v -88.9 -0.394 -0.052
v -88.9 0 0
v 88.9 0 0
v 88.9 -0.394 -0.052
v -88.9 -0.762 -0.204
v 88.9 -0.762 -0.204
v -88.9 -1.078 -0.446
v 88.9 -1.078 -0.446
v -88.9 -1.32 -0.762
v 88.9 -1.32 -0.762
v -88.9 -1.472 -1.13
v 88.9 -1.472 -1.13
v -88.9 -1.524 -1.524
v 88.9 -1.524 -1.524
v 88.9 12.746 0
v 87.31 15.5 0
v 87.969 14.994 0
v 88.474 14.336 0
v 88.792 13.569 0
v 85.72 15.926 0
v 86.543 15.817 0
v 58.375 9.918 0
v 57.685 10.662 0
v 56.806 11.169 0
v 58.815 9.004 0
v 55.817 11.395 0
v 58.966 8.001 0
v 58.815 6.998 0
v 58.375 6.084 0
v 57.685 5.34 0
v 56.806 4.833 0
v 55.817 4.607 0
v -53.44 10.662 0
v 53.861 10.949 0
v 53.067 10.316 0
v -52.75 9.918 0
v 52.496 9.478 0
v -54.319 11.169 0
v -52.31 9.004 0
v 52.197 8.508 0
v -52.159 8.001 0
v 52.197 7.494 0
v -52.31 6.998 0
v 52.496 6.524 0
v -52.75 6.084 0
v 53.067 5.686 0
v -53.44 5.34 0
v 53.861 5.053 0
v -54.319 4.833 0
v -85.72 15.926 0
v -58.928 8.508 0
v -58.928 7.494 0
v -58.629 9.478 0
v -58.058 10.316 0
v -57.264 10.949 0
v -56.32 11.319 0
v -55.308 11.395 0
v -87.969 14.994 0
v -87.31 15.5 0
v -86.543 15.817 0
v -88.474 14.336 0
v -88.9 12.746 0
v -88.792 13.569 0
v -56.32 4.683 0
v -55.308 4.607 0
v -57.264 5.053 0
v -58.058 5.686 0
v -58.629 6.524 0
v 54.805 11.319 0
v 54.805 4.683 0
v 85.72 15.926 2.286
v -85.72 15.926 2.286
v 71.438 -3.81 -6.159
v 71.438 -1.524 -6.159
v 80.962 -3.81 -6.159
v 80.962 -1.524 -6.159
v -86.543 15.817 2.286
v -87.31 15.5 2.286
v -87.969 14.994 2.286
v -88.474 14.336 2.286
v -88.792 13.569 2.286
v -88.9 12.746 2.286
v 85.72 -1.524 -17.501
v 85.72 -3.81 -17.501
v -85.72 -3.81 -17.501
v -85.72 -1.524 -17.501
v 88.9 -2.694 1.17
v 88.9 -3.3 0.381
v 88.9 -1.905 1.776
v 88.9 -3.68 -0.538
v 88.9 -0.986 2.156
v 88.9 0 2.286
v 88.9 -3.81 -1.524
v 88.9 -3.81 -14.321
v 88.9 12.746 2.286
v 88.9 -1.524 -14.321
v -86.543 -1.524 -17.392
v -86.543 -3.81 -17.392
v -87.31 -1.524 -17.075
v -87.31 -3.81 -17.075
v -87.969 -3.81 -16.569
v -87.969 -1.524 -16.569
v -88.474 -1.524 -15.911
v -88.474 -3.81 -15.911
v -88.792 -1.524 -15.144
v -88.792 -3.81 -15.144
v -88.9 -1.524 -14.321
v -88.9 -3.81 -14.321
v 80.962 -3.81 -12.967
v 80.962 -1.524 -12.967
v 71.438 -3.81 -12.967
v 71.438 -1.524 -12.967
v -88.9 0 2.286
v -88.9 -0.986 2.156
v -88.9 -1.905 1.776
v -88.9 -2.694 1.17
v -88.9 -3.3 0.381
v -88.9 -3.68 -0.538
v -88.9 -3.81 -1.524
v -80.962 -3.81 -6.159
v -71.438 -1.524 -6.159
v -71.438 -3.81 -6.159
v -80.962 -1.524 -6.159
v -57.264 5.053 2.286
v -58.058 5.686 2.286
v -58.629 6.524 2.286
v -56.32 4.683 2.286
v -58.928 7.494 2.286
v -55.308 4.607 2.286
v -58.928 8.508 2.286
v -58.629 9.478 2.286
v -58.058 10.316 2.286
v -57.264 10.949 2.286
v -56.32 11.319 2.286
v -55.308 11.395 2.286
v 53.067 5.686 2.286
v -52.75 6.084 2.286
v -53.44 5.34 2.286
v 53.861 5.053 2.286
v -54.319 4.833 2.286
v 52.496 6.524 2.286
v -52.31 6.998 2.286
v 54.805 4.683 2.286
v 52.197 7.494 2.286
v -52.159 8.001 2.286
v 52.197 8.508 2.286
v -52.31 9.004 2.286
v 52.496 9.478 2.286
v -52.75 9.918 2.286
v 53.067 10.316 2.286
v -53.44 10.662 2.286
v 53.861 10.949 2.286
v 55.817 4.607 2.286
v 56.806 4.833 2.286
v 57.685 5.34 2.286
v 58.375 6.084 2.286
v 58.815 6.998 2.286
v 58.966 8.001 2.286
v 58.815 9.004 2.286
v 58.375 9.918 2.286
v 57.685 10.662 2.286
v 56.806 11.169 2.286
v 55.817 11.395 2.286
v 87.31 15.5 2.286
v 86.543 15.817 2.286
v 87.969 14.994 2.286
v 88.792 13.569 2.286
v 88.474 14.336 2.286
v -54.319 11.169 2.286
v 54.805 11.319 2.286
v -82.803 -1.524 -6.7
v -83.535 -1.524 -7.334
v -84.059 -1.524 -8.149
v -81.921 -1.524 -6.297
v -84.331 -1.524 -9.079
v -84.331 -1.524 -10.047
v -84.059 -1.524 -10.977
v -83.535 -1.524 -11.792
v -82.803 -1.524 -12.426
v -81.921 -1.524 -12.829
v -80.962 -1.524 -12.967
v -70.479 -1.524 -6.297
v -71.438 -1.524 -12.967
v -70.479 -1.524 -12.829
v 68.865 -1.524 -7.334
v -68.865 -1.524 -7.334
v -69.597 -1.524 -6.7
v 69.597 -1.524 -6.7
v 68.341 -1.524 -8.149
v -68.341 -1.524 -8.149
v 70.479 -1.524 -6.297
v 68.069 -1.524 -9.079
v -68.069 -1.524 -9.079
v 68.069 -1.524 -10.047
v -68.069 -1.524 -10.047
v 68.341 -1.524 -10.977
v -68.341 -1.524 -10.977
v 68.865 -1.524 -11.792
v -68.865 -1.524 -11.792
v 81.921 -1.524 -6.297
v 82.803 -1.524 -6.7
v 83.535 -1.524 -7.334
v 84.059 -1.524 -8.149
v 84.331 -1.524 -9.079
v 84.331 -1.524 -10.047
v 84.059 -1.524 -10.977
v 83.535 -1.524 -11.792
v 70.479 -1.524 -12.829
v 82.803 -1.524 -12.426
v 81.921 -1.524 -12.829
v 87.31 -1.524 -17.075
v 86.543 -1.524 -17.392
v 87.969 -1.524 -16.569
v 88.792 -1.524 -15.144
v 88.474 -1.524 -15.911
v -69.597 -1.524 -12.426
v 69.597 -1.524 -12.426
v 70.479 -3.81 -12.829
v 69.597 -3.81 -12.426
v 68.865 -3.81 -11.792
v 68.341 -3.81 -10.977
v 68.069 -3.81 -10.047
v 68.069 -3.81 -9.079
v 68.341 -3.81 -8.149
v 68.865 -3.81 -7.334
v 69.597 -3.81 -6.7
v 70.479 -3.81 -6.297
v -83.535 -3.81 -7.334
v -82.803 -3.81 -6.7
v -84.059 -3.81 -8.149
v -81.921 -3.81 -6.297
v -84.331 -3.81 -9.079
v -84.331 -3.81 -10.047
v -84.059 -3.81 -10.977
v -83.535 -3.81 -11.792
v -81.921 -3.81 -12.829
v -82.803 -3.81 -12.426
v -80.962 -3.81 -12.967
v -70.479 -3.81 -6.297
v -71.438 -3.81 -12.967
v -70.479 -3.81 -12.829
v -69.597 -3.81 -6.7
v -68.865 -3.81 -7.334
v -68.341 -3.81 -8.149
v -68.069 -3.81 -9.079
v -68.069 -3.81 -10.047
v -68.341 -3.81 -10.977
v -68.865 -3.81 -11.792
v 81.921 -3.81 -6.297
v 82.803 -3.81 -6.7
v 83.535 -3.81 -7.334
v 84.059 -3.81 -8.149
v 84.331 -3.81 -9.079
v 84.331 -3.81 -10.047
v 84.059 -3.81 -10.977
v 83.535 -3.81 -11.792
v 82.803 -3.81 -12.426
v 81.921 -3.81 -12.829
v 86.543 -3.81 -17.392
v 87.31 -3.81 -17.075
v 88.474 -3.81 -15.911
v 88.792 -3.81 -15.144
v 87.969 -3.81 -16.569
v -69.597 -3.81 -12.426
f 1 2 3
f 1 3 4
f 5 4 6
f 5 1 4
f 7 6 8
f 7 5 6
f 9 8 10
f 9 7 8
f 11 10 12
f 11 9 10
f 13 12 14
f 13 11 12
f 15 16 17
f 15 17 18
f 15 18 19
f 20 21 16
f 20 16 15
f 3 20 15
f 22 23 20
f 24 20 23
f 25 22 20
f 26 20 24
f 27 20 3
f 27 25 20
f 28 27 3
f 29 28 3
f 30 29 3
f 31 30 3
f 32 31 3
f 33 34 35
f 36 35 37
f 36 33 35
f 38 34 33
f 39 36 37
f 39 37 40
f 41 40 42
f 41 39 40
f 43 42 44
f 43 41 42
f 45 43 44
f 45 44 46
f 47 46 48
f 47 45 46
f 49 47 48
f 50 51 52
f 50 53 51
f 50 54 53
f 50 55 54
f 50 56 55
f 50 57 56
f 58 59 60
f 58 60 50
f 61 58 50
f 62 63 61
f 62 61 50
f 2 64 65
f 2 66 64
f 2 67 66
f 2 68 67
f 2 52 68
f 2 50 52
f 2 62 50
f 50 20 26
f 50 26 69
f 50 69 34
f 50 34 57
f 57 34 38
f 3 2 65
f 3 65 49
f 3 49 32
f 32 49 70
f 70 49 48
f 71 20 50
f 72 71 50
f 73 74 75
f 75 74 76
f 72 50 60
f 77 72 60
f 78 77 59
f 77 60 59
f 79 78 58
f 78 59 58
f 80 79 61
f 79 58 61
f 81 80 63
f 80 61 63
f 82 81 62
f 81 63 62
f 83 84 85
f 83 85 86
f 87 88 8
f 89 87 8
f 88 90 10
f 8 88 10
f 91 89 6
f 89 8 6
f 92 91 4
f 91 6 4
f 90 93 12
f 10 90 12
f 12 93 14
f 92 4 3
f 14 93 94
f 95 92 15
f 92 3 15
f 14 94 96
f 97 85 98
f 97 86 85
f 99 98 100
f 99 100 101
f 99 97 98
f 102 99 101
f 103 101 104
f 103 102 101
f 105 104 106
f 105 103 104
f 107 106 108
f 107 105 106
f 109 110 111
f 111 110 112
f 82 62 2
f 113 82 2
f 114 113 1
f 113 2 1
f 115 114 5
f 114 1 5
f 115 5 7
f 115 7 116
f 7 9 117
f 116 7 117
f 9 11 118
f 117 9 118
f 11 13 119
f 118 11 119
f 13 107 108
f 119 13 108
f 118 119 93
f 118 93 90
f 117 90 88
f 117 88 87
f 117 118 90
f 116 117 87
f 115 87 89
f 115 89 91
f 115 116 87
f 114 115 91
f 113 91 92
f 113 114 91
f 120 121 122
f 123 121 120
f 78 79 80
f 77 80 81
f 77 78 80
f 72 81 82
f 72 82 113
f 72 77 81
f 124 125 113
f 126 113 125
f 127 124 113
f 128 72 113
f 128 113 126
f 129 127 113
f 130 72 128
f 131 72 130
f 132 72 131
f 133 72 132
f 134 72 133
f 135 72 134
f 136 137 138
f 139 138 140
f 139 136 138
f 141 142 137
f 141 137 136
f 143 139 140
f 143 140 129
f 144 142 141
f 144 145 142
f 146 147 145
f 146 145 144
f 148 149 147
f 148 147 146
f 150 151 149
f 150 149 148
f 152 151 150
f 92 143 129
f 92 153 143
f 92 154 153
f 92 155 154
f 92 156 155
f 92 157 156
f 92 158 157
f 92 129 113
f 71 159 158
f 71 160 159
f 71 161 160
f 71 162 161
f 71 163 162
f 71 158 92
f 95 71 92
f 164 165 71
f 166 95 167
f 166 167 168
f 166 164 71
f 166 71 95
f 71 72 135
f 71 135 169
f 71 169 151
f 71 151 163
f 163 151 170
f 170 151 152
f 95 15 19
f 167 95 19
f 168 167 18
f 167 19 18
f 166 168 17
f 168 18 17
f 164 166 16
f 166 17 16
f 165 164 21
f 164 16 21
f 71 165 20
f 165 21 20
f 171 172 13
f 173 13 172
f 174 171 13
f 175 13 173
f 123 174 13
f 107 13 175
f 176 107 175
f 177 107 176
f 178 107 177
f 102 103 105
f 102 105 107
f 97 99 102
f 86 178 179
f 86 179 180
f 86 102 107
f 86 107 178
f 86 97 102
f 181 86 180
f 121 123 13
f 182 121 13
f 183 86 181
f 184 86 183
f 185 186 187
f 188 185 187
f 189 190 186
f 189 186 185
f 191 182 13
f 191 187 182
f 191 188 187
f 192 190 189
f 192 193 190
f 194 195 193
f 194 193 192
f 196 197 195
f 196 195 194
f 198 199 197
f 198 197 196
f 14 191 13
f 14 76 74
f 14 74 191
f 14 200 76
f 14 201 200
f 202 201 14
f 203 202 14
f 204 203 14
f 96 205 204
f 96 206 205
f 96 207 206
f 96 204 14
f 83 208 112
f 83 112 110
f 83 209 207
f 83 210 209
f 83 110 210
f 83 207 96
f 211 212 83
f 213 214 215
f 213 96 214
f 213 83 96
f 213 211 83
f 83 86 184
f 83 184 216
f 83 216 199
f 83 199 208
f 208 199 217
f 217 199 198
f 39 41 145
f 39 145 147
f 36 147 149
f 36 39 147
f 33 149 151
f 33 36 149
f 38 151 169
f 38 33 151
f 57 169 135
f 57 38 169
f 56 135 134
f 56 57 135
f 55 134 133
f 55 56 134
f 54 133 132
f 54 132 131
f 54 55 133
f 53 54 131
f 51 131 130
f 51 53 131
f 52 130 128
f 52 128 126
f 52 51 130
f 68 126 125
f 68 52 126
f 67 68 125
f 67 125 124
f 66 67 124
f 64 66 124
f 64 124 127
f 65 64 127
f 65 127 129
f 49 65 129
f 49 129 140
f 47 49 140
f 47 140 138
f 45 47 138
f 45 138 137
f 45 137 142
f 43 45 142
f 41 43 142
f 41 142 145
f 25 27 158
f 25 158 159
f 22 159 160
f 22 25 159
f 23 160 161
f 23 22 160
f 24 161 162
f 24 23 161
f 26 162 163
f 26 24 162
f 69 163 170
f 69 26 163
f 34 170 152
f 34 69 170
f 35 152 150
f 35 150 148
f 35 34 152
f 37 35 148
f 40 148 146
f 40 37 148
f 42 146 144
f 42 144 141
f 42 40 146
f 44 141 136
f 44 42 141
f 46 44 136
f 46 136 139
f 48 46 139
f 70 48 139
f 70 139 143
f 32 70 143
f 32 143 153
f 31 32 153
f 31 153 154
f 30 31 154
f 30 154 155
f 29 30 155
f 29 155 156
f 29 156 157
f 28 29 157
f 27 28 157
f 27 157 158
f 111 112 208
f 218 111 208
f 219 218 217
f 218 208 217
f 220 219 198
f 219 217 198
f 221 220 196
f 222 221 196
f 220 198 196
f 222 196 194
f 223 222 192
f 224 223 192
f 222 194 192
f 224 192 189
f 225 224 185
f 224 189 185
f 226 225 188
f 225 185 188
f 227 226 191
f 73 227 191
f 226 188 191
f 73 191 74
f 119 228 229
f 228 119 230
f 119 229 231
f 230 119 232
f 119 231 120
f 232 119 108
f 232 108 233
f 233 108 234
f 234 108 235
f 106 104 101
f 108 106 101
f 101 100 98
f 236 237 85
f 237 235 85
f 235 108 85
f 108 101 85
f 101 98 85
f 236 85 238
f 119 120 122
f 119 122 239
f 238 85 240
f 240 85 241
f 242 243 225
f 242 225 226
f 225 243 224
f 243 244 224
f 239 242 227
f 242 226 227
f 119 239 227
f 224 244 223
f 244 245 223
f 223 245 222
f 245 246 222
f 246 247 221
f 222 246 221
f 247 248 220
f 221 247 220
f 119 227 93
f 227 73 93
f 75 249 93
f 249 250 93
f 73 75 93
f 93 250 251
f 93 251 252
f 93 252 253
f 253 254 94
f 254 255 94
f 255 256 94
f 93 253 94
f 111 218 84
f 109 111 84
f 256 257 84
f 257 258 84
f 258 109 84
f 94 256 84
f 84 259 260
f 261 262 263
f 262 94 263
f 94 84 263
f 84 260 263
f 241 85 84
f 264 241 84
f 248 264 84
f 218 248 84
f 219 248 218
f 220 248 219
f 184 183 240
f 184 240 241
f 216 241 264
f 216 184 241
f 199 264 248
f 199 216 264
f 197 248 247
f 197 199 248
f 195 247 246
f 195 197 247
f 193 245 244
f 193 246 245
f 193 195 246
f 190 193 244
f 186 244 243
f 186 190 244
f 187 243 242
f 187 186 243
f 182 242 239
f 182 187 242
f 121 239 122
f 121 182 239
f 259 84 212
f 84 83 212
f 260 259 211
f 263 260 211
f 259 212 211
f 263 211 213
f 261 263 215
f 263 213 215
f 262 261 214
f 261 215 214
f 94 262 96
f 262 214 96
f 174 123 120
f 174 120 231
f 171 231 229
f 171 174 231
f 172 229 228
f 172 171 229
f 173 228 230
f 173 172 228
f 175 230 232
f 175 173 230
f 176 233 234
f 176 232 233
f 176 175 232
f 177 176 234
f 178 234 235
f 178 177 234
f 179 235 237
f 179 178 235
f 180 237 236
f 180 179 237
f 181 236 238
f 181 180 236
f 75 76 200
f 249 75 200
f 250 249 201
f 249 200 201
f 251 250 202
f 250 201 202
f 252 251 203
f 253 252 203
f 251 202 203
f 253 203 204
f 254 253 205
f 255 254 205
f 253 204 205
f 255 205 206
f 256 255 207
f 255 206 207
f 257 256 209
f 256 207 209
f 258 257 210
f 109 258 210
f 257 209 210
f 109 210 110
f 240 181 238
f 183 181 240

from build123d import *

# Parameters (mm, degrees)
EXTRUDE1_DEPTH             = 88.9
FILLET1_R                  = 3.18
EXTRUDE2_REACH             = 94.271
EXTRUDE3_REACH             = 93.995
SKETCH3_R                  = 3.4036
FLATTEN_BENDS1_START       = -1.524
FLATTEN_BENDS1_OUTLINE_W   = 177.8
FLATTEN_BENDS1_OUTLINE_H   = 5.286
FLATTEN_BENDS1_DEPTH       = 17.4498
FLATTEN_BENDS1_START_2     = -3.81
FLATTEN_BENDS1_2_OUTLINE_R = 3.4036
FLATTEN_BENDS1_2_DEPTH     = 2.286
PROCESS_BENDS1_START       = 2.234903703
PROCESS_BENDS1_OUTLINE_W   = 177.8
PROCESS_BENDS1_OUTLINE_H   = 2.286
PROCESS_BENDS1_DEPTH       = 16.356210101
PROCESS_BENDS1_2_OUTLINE_R = 3.4036
PROCESS_BENDS1_2_DEPTH     = 1.8835878
PROCESS_BENDS1_START_2     = 2.04455268
PROCESS_BENDS1_3_OUTLINE_W = 177.8
PROCESS_BENDS1_3_OUTLINE_H = 2.286
PROCESS_BENDS1_3_DEPTH     = 0.190351023
PROCESS_BENDS1_START_3     = -1.524
PROCESS_BENDS1_4_OUTLINE_R = 3.4036
PROCESS_BENDS1_4_DEPTH     = 3.81
PROCESS_BENDS1_START_4     = -88.9
PROCESS_BENDS1_5_DEPTH     = 177.8


with BuildPart() as part:
    # Sketch1 → Extrude1 (new, symmetric)
    with BuildSketch(Plane(origin=(0, 0, 0), x_dir=(0, 0, -1), z_dir=(1, 0, 0))):
        with BuildLine():
            Line((17.5006, -3.81), (17.5006, -1.524))
            Line((17.5006, -1.524), (1.524, -1.524))
            ThreePointArc((1.524, -1.524), (0.446369265, -1.077630735), (0, 0))
            Line((0, 0), (0, 15.9258))
            Line((0, 15.9258), (-2.286, 15.9258))
            Line((-2.286, 15.9258), (-2.286, 0))
            ThreePointArc((-2.286, 0), (-1.170076836, -2.694076836), (1.524, -3.81))
            Line((1.524, -3.81), (17.5006, -3.81))
        make_face()
    extrude(amount=EXTRUDE1_DEPTH, both=True)

    # Fillet1
    fillet1_edges = [part.edges().sort_by_distance(p)[0] for p in [
        (-88.9, -2.667, -17.5006),
        (88.9, 15.9258, 1.143),
        (88.9, -2.667, -17.5006),
        (-88.9, 15.9258, 1.143),
    ]]
    fillet(fillet1_edges, radius=FILLET1_R)

    # Sketch2 → Extrude2 (cut, up to next)
    with BuildSketch(Plane(origin=(0, -1.524, 0), x_dir=(1, 0, 0), z_dir=(0, 1, 0)), mode=Mode.PRIVATE) as extrude2_sk1:
        with BuildLine():
            Line((80.9625, 12.9667), (71.4375, 12.9667))
            ThreePointArc((71.4375, 12.9667), (68.0339, 9.5631), (71.4375, 6.1595))
            Line((71.4375, 6.1595), (80.9625, 6.1595))
            ThreePointArc((80.9625, 6.1595), (84.3661, 9.5631), (80.9625, 12.9667))
        make_face()
    extrude2_tool1 = extrude(extrude2_sk1.sketch, amount=-EXTRUDE2_REACH, mode=Mode.PRIVATE) & part.part
    # Sketch2 → Extrude2 (cut, up to next)
    with BuildSketch(Plane(origin=(0, -1.524, 0), x_dir=(1, 0, 0), z_dir=(0, 1, 0)), mode=Mode.PRIVATE) as extrude2_sk2:
        with BuildLine():
            Line((-71.4375, 6.1595), (-80.9625, 6.1595))
            ThreePointArc((-80.9625, 6.1595), (-84.3661, 9.5631), (-80.9625, 12.9667))
            Line((-80.9625, 12.9667), (-71.4375, 12.9667))
            ThreePointArc((-71.4375, 12.9667), (-68.0339, 9.5631), (-71.4375, 6.1595))
        make_face()
    extrude2_tool2 = extrude(extrude2_sk2.sketch, amount=-EXTRUDE2_REACH, mode=Mode.PRIVATE) & part.part
    add(extrude2_tool1.solids().sort_by_distance((76.2, -1.524, -9.5631))[0], mode=Mode.SUBTRACT)
    add(extrude2_tool2.solids().sort_by_distance((-76.2, -1.524, -9.5631))[0], mode=Mode.SUBTRACT)

    # Sketch3 → Extrude3 (cut, up to next)
    with BuildSketch(Plane(origin=(0, 0, 0), x_dir=(-1, 0, 0), z_dir=(0, 0, -1)), mode=Mode.PRIVATE) as extrude3_sk1:
        with Locations(Location((-55.5625, 8.001, 0), (0, 0, 90))):
            Circle(SKETCH3_R)
    extrude3_tool1 = extrude(extrude3_sk1.sketch, amount=-EXTRUDE3_REACH, mode=Mode.PRIVATE) & part.part
    # Sketch3 → Extrude3 (cut, up to next)
    with BuildSketch(Plane(origin=(0, 0, 0), x_dir=(-1, 0, 0), z_dir=(0, 0, -1)), mode=Mode.PRIVATE) as extrude3_sk2:
        with Locations(Location((55.5625, 8.001, 0), (0, 0, 90))):
            Circle(SKETCH3_R)
    extrude3_tool2 = extrude(extrude3_sk2.sketch, amount=-EXTRUDE3_REACH, mode=Mode.PRIVATE) & part.part
    add(extrude3_tool1.solids().sort_by_distance((55.5625, 8.001, 0))[0], mode=Mode.SUBTRACT)
    add(extrude3_tool2.solids().sort_by_distance((-55.5625, 8.001, 0))[0], mode=Mode.SUBTRACT)

    # Flatten-Bends1: read off the stored shape, not the designer's step
    # Flatten-Bends1 outline → Flatten-Bends1 (cut)
    with BuildSketch(Plane(origin=(0, 0, 0), x_dir=(1, 0, 0), z_dir=(0, 1, 0)).offset(FLATTEN_BENDS1_START)):
        with Locations((0, 0.357)):
            Rectangle(FLATTEN_BENDS1_OUTLINE_W, FLATTEN_BENDS1_OUTLINE_H)
    extrude(amount=FLATTEN_BENDS1_DEPTH, mode=Mode.SUBTRACT)

    # Flatten-Bends1 2 outline → Flatten-Bends1 2 (add)
    with BuildSketch(Plane(origin=(0, 0, 0), x_dir=(1, 0, 0), z_dir=(0, 1, 0)).offset(FLATTEN_BENDS1_START_2)):
        with BuildLine():
            ThreePointArc((-88.9, -15.411113804), (-87.968599564, -17.659713368), (-85.72, -18.591113804))
            Line((-85.72, -18.591113804), (85.72, -18.591113804))
            ThreePointArc((85.72, -18.591113804), (87.968599564, -17.659713368), (88.9, -15.411113804))
            Line((88.9, -15.411113804), (88.9, 3))
            Line((88.9, 3), (-88.9, 3))
            Line((-88.9, 3), (-88.9, -15.411113804))
        make_face()
        with Locations((-55.5625, -10.666313804)):
            Circle(FLATTEN_BENDS1_2_OUTLINE_R, mode=Mode.SUBTRACT)
        with Locations((55.5625, -10.666313804)):
            Circle(FLATTEN_BENDS1_2_OUTLINE_R, mode=Mode.SUBTRACT)
    extrude(amount=FLATTEN_BENDS1_2_DEPTH)

    # Process-Bends1: read off the stored shape, not the designer's step
    # Process-Bends1 outline → Process-Bends1 (cut)
    with BuildSketch(Plane.XY.offset(PROCESS_BENDS1_START)):
        with Locations((0, -2.667)):
            Rectangle(PROCESS_BENDS1_OUTLINE_W, PROCESS_BENDS1_OUTLINE_H)
    extrude(amount=PROCESS_BENDS1_DEPTH, mode=Mode.SUBTRACT)

    # Process-Bends1 2 outline → Process-Bends1 2 (add)
    with BuildSketch(Plane.XY):
        with BuildLine():
            Line((-88.9, 12.7458), (-88.9, -1.524))
            Line((-88.9, -1.524), (88.9, -1.524))
            Line((88.9, -1.524), (88.9, 12.7458))
            ThreePointArc((88.9, 12.7458), (87.968599564, 14.994399564), (85.72, 15.9258))
            Line((85.72, 15.9258), (-85.72, 15.9258))
            ThreePointArc((-85.72, 15.9258), (-87.968599564, 14.994399564), (-88.9, 12.7458))
        make_face()
        with Locations((-55.5625, 8.001)):
            Circle(PROCESS_BENDS1_2_OUTLINE_R, mode=Mode.SUBTRACT)
        with Locations((55.5625, 8.001)):
            Circle(PROCESS_BENDS1_2_OUTLINE_R, mode=Mode.SUBTRACT)
    extrude(amount=PROCESS_BENDS1_2_DEPTH)

    # Process-Bends1 3 outline → Process-Bends1 3 (cut)
    with BuildSketch(Plane.XY.offset(PROCESS_BENDS1_START_2)):
        with Locations((0, -2.667)):
            Rectangle(PROCESS_BENDS1_3_OUTLINE_W, PROCESS_BENDS1_3_OUTLINE_H)
    extrude(amount=PROCESS_BENDS1_3_DEPTH, mode=Mode.SUBTRACT)

    # Process-Bends1 4 outline → Process-Bends1 4 (add)
    with BuildSketch(Plane.XY.offset(PROCESS_BENDS1_START_3)):
        with BuildLine():
            Line((-88.9, 12.7458), (-88.9, -1.524))
            Line((-88.9, -1.524), (88.9, -1.524))
            Line((88.9, -1.524), (88.9, 12.7458))
            ThreePointArc((88.9, 12.7458), (87.968599564, 14.994399564), (85.72, 15.9258))
            Line((85.72, 15.9258), (-85.72, 15.9258))
            ThreePointArc((-85.72, 15.9258), (-87.968599564, 14.994399564), (-88.9, 12.7458))
        make_face()
        with Locations((-55.5625, 8.001)):
            Circle(PROCESS_BENDS1_4_OUTLINE_R, mode=Mode.SUBTRACT)
        with Locations((55.5625, 8.001)):
            Circle(PROCESS_BENDS1_4_OUTLINE_R, mode=Mode.SUBTRACT)
    extrude(amount=PROCESS_BENDS1_4_DEPTH)

    # Process-Bends1 5 outline → Process-Bends1 5 (cut)
    with BuildSketch(Plane.YZ.offset(PROCESS_BENDS1_START_4)):
        with BuildLine():
            Line((15.9258, -1.524), (15.9258, 0))
            Line((15.9258, 0), (0, 0))
            ThreePointArc((0, 0), (-1.077630735, -0.446369265), (-1.524, -1.524))
            Line((-1.524, -1.524), (15.9258, -1.524))
        make_face()
        with BuildLine():
            ThreePointArc((-3.81, -1.524), (-2.694076836, 1.170076836), (0, 2.286))
            Line((0, 2.286), (-1.524, 2.286))
            Line((-1.524, 2.286), (-1.524, 2.04455268))
            Line((-1.524, 2.04455268), (-3.81, 2.04455268))
            Line((-3.81, 2.04455268), (-3.81, -1.524))
        make_face()
    extrude(amount=PROCESS_BENDS1_5_DEPTH, mode=Mode.SUBTRACT)


solid = part.part
